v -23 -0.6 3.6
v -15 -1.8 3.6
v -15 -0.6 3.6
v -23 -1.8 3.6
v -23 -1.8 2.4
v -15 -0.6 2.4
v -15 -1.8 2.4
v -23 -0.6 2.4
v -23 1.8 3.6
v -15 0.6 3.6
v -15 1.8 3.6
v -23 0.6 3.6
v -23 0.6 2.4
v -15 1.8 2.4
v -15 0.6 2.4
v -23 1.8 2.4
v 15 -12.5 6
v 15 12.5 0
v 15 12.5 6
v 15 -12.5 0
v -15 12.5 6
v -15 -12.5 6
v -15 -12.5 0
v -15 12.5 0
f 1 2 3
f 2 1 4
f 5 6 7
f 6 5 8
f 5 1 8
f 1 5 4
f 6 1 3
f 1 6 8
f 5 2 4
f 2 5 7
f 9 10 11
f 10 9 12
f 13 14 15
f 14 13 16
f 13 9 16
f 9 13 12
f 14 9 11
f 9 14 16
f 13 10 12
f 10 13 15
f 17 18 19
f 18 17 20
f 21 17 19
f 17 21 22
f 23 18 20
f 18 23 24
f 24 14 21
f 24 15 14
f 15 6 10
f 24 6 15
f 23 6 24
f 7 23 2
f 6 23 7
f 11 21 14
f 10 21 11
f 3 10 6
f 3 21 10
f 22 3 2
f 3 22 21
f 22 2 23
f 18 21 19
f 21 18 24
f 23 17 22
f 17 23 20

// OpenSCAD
// file: ../../lipo-cradle/lipo-cradle.scad
//-----------------------------------------------------------------------
// LiPo pouch cell, in a low open cradle on the floor
//
// A low wall round the pack's footprint, with a gap on one side for the
// lead. The pack drops in and the lid (or a strap) keeps it down. Optional
// strap bars on the two long sides take a hook-and-loop strap over the pack:
// the strap goes down outside the wall, under the bar, and back up.
//
// Modules, all in the same frame:
//   lipoGhost()    the pack, for previews
//   lipoCradle()   the plastic: wall, lead gap, optional strap bars
//   lipoBody()     the pack as a plain solid (views, collision checks)
//
// Frame: origin on the floor top, at the centre of the pack's footprint.
// X along the pack's length (the tab and lead at -X), Y across its width,
// Z up. Units: mm.
//
// Sizes: the pouch code on the label, TTWWLL = thickness in tenths of a mm,
// width, length in whole mm (602530 = 6.0 x 25 x 30). Named packs are in
// lipoPacks; lipoCodeDims("503035") decodes any other code. Codes are the
// CELL: a pack with its protection board folded at the tab end is a few mm
// longer, and pouches swell, so measure the pack and use the allowances.
//
// Use with `use <.../components/lipo-cradle/lipo-cradle.scad>`.
//-----------------------------------------------------------------------

//-- [name, thickness, width, length, note]. The cell sizes from the code, except where measured
lipoPacks = [
  ["402030",  4.0, 20, 30, ""],
  ["502030",  5.0, 20, 30, ""],
  ["602530",  6.0, 25, 30, "500 mAh in use, controller project (label read 2026-10-30)"],
  ["503035",  5.0, 30, 35, ""],
  ["403048",  4.0, 30, 48, ""],
  ["603048",  6.0, 30, 48, ""],
  ["503450",  5.0, 34, 50, ""],
  ["603450",  6.0, 34, 50, ""],
  ["103450", 10.0, 34, 50, "the 10 is whole mm: 1800-2000 mAh"],
  ["902030",  9.0, 20, 30, ""],
  ["605060",  6.0, 50, 60, ""],
  ["803860",  8.0, 38, 60, "2000 mAh class"],
  ["PKCell-2000", 8.0, 38, 60, "Pi Hut 105187, 2000 mAh, vendor size; lead 100, JST-PH"],
];

//-- decode a six-digit code: TT in tenths of a mm (20 and up), WW, LL in mm.
//-- Codes starting with 1 (10-19) are ambiguous (103450 is 10 mm thick): put them in lipoPacks
function lipoCodeDims(code) =
  let (d = [for (c = code) ord(c) - 48],
       t = d[0]*10 + d[1])
  assert(len(code) == 6 && min(d) >= 0 && max(d) <= 9, str("not a six-digit pouch code: ", code))
  assert(t >= 20, str("ambiguous thickness in ", code, ": add it to lipoPacks"))
  [t/10, d[2]*10 + d[3], d[4]*10 + d[5]];

//-- [thickness, width, length] by name, or decoded from the code
function lipoDims(name) = let (i = search([name], lipoPacks)[0])
  (i != [] && i != undef) ? [lipoPacks[i][1], lipoPacks[i][2], lipoPacks[i][3]] : lipoCodeDims(name);

lipoDefault    = "602530";

//-- The cradle
lipoClearance  = 0.4;     // each side, pack to wall (controller base fitClearance). CAL by the fit piece
lipoWall       = 1.6;
lipoWallH      = 4;       // above the floor (controller base: 4 for a 6 thick pack)
lipoLeadGap    = 12;      // gap in the wall for the lead (controller base: 12)
lipoPcmAllow   = 0;       // added to the length at the tab end, for a protection board past the cell: CAL
lipoSwell      = 0.10;    // allow 10 % on the thickness for a pouch swelling with age
lipoTopGap     = 0.5;     // above the swollen pack, under the lid
//-- strap bars: off unless strap > 0 (the strap's width)
lipoStrapGap   = 2.0;     // wall to bar, and floor to bar: room for the strap
lipoStrapBar   = 2.0;     // bar thickness (Y) and height (Z)
lipoStrapPost  = 2.0;     // posts each end of the bar

//-- headroom over the floor the lid must clear
function lipoHeadroom(name = lipoDefault, swell = lipoSwell) = lipoDims(name)[0]*(1 + swell) + lipoTopGap;

module lipoBody(name = lipoDefault, pcm = lipoPcmAllow)
{
  d = lipoDims(name);
  translate([-d[2]/2 - pcm, -d[1]/2, 0]) cube([d[2] + pcm, d[1], d[0]]);
}

module lipoGhost(name = lipoDefault, pcm = lipoPcmAllow)
{
  d = lipoDims(name);
  %color("Silver") lipoBody(name, pcm);
  //-- the lead, out of the tab end
  for (s = [-1, 1])
    %color(s < 0 ? "Black" : "Red") translate([-d[2]/2 - pcm - 15, s*1.2 - 0.6, d[0]/2 - 0.6]) cube([15, 1.2, 1.2]);
}

//-- leadSide: "-x" (default, the tab end), "+x", "-y", "+y". strap: strap width, 0 for none
module lipoCradle(name = lipoDefault, clearance = lipoClearance, h = lipoWallH, leadSide = "-x",
                  gap = lipoLeadGap, pcm = lipoPcmAllow, strap = 0)
{
  d = lipoDims(name);
  lx = d[2] + pcm; ly = d[1];
  x0 = -d[2]/2 - pcm;                                    // pack's -X end
  c = clearance; w = lipoWall;
  assert(gap < min(lx, ly) - 2, "lead gap wider than the side it's in");
  translate([0, 0, -0.01])
    difference()
    {
      translate([x0 - c - w, -ly/2 - c - w, 0]) cube([lx + 2*(c + w), ly + 2*(c + w), h + 0.01]);
      translate([x0 - c, -ly/2 - c, -1]) cube([lx + 2*c, ly + 2*c, h + 2]);
      //-- lead gap, centred on its side
      if (leadSide == "-x") translate([x0 - c - w - 1, -gap/2, -1]) cube([w + 2, gap, h + 2]);
      if (leadSide == "+x") translate([x0 + lx + c - 1, -gap/2, -1]) cube([w + 2, gap, h + 2]);
      if (leadSide == "-y") translate([x0 + lx/2 - gap/2, -ly/2 - c - w - 1, -1]) cube([gap, w + 2, h + 2]);
      if (leadSide == "+y") translate([x0 + lx/2 - gap/2, ly/2 + c - 1, -1]) cube([gap, w + 2, h + 2]);
    }
  //-- strap bars on the long sides, across the middle of the pack
  if (strap > 0)
    for (m = [0, 1])
      mirror([0, m, 0])
        translate([x0 + lx/2, ly/2 + c + w + lipoStrapGap, -0.01])
          difference()
          {
            translate([-strap/2 - 0.5 - lipoStrapPost, 0, 0])
              cube([strap + 1 + 2*lipoStrapPost, lipoStrapBar, lipoStrapGap + lipoStrapBar + 0.01]);
            translate([-strap/2 - 0.5, -1, -1]) cube([strap + 1, lipoStrapBar + 2, lipoStrapGap + 1.01]);
          }
}
// main file
// The 602530 pack as a solid, in its cradle on the station, for the catalogue (the Ghost is %
// so it never renders). Also the body for the collision check.
use <../../lipo-cradle/lipo-cradle.scad>

pack = "602530";
d = lipoDims(pack);

lipoBody(pack);
//-- the lead, out of the tab end
for (s = [-1, 1]) translate([-d[2]/2 - 8, s*1.2 - 0.6, d[0]/2 - 0.6]) cube([8.01, 1.2, 1.2]);
